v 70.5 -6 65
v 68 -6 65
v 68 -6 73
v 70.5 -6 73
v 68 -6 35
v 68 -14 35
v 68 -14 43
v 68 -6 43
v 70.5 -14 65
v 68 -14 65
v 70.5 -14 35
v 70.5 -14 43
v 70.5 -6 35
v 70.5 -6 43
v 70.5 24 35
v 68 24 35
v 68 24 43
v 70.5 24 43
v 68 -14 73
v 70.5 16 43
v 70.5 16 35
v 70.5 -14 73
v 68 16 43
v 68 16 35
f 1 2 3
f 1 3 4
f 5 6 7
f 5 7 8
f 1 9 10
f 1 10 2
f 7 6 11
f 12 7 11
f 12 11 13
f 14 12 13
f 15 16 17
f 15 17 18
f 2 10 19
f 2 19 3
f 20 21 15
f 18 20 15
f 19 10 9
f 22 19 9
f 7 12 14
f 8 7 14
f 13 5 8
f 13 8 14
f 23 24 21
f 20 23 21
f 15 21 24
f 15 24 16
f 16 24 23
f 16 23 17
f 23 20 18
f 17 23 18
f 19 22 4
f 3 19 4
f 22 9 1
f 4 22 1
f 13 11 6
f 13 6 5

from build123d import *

# Parameters (mm, degrees)
BOX810_W     = 8
BOX810_H     = 2.5
BOX810_DEPTH = 8
BOX808_W     = 8
BOX808_H     = 2.5
BOX808_DEPTH = 8
BOX811_W     = 8
BOX811_H     = 2.5
BOX811_DEPTH = 8


with BuildPart() as krychle810:
    # Box810 → Box810 (new body)
    with BuildSketch(Plane(origin=(-68, 16, 35), x_dir=(0, 1, 0), z_dir=(0, 0, 1))):
        with Locations((4, 1.25)):
            Rectangle(BOX810_W, BOX810_H)
    extrude(amount=BOX810_DEPTH)


with BuildPart() as krychle808:
    # Box808 → Box808 (new body)
    with BuildSketch(Plane(origin=(-68, -14, 65), x_dir=(0, 1, 0), z_dir=(0, 0, 1))):
        with Locations((4, 1.25)):
            Rectangle(BOX808_W, BOX808_H)
    extrude(amount=BOX808_DEPTH)


with BuildPart() as compound942:
    # Box811 → Box811 (new body)
    with BuildSketch(Plane(origin=(-68, -14, 35), x_dir=(0, 1, 0), z_dir=(0, 0, 1))):
        with Locations((4, 1.25)):
            Rectangle(BOX811_W, BOX811_H)
    extrude(amount=BOX811_DEPTH)

    # Compound942: union Krychle810, Krychle808
    add(krychle810.part)
    add(krychle808.part)


with BuildPart() as compound942_mirrored:
    # mirror006: instance of Compound942
    add(compound942.part.mirror(Plane(origin=(0, 0, 0), x_dir=(0, -1, 0), z_dir=(1, 0, 0))))


solid = compound942_mirrored.part
